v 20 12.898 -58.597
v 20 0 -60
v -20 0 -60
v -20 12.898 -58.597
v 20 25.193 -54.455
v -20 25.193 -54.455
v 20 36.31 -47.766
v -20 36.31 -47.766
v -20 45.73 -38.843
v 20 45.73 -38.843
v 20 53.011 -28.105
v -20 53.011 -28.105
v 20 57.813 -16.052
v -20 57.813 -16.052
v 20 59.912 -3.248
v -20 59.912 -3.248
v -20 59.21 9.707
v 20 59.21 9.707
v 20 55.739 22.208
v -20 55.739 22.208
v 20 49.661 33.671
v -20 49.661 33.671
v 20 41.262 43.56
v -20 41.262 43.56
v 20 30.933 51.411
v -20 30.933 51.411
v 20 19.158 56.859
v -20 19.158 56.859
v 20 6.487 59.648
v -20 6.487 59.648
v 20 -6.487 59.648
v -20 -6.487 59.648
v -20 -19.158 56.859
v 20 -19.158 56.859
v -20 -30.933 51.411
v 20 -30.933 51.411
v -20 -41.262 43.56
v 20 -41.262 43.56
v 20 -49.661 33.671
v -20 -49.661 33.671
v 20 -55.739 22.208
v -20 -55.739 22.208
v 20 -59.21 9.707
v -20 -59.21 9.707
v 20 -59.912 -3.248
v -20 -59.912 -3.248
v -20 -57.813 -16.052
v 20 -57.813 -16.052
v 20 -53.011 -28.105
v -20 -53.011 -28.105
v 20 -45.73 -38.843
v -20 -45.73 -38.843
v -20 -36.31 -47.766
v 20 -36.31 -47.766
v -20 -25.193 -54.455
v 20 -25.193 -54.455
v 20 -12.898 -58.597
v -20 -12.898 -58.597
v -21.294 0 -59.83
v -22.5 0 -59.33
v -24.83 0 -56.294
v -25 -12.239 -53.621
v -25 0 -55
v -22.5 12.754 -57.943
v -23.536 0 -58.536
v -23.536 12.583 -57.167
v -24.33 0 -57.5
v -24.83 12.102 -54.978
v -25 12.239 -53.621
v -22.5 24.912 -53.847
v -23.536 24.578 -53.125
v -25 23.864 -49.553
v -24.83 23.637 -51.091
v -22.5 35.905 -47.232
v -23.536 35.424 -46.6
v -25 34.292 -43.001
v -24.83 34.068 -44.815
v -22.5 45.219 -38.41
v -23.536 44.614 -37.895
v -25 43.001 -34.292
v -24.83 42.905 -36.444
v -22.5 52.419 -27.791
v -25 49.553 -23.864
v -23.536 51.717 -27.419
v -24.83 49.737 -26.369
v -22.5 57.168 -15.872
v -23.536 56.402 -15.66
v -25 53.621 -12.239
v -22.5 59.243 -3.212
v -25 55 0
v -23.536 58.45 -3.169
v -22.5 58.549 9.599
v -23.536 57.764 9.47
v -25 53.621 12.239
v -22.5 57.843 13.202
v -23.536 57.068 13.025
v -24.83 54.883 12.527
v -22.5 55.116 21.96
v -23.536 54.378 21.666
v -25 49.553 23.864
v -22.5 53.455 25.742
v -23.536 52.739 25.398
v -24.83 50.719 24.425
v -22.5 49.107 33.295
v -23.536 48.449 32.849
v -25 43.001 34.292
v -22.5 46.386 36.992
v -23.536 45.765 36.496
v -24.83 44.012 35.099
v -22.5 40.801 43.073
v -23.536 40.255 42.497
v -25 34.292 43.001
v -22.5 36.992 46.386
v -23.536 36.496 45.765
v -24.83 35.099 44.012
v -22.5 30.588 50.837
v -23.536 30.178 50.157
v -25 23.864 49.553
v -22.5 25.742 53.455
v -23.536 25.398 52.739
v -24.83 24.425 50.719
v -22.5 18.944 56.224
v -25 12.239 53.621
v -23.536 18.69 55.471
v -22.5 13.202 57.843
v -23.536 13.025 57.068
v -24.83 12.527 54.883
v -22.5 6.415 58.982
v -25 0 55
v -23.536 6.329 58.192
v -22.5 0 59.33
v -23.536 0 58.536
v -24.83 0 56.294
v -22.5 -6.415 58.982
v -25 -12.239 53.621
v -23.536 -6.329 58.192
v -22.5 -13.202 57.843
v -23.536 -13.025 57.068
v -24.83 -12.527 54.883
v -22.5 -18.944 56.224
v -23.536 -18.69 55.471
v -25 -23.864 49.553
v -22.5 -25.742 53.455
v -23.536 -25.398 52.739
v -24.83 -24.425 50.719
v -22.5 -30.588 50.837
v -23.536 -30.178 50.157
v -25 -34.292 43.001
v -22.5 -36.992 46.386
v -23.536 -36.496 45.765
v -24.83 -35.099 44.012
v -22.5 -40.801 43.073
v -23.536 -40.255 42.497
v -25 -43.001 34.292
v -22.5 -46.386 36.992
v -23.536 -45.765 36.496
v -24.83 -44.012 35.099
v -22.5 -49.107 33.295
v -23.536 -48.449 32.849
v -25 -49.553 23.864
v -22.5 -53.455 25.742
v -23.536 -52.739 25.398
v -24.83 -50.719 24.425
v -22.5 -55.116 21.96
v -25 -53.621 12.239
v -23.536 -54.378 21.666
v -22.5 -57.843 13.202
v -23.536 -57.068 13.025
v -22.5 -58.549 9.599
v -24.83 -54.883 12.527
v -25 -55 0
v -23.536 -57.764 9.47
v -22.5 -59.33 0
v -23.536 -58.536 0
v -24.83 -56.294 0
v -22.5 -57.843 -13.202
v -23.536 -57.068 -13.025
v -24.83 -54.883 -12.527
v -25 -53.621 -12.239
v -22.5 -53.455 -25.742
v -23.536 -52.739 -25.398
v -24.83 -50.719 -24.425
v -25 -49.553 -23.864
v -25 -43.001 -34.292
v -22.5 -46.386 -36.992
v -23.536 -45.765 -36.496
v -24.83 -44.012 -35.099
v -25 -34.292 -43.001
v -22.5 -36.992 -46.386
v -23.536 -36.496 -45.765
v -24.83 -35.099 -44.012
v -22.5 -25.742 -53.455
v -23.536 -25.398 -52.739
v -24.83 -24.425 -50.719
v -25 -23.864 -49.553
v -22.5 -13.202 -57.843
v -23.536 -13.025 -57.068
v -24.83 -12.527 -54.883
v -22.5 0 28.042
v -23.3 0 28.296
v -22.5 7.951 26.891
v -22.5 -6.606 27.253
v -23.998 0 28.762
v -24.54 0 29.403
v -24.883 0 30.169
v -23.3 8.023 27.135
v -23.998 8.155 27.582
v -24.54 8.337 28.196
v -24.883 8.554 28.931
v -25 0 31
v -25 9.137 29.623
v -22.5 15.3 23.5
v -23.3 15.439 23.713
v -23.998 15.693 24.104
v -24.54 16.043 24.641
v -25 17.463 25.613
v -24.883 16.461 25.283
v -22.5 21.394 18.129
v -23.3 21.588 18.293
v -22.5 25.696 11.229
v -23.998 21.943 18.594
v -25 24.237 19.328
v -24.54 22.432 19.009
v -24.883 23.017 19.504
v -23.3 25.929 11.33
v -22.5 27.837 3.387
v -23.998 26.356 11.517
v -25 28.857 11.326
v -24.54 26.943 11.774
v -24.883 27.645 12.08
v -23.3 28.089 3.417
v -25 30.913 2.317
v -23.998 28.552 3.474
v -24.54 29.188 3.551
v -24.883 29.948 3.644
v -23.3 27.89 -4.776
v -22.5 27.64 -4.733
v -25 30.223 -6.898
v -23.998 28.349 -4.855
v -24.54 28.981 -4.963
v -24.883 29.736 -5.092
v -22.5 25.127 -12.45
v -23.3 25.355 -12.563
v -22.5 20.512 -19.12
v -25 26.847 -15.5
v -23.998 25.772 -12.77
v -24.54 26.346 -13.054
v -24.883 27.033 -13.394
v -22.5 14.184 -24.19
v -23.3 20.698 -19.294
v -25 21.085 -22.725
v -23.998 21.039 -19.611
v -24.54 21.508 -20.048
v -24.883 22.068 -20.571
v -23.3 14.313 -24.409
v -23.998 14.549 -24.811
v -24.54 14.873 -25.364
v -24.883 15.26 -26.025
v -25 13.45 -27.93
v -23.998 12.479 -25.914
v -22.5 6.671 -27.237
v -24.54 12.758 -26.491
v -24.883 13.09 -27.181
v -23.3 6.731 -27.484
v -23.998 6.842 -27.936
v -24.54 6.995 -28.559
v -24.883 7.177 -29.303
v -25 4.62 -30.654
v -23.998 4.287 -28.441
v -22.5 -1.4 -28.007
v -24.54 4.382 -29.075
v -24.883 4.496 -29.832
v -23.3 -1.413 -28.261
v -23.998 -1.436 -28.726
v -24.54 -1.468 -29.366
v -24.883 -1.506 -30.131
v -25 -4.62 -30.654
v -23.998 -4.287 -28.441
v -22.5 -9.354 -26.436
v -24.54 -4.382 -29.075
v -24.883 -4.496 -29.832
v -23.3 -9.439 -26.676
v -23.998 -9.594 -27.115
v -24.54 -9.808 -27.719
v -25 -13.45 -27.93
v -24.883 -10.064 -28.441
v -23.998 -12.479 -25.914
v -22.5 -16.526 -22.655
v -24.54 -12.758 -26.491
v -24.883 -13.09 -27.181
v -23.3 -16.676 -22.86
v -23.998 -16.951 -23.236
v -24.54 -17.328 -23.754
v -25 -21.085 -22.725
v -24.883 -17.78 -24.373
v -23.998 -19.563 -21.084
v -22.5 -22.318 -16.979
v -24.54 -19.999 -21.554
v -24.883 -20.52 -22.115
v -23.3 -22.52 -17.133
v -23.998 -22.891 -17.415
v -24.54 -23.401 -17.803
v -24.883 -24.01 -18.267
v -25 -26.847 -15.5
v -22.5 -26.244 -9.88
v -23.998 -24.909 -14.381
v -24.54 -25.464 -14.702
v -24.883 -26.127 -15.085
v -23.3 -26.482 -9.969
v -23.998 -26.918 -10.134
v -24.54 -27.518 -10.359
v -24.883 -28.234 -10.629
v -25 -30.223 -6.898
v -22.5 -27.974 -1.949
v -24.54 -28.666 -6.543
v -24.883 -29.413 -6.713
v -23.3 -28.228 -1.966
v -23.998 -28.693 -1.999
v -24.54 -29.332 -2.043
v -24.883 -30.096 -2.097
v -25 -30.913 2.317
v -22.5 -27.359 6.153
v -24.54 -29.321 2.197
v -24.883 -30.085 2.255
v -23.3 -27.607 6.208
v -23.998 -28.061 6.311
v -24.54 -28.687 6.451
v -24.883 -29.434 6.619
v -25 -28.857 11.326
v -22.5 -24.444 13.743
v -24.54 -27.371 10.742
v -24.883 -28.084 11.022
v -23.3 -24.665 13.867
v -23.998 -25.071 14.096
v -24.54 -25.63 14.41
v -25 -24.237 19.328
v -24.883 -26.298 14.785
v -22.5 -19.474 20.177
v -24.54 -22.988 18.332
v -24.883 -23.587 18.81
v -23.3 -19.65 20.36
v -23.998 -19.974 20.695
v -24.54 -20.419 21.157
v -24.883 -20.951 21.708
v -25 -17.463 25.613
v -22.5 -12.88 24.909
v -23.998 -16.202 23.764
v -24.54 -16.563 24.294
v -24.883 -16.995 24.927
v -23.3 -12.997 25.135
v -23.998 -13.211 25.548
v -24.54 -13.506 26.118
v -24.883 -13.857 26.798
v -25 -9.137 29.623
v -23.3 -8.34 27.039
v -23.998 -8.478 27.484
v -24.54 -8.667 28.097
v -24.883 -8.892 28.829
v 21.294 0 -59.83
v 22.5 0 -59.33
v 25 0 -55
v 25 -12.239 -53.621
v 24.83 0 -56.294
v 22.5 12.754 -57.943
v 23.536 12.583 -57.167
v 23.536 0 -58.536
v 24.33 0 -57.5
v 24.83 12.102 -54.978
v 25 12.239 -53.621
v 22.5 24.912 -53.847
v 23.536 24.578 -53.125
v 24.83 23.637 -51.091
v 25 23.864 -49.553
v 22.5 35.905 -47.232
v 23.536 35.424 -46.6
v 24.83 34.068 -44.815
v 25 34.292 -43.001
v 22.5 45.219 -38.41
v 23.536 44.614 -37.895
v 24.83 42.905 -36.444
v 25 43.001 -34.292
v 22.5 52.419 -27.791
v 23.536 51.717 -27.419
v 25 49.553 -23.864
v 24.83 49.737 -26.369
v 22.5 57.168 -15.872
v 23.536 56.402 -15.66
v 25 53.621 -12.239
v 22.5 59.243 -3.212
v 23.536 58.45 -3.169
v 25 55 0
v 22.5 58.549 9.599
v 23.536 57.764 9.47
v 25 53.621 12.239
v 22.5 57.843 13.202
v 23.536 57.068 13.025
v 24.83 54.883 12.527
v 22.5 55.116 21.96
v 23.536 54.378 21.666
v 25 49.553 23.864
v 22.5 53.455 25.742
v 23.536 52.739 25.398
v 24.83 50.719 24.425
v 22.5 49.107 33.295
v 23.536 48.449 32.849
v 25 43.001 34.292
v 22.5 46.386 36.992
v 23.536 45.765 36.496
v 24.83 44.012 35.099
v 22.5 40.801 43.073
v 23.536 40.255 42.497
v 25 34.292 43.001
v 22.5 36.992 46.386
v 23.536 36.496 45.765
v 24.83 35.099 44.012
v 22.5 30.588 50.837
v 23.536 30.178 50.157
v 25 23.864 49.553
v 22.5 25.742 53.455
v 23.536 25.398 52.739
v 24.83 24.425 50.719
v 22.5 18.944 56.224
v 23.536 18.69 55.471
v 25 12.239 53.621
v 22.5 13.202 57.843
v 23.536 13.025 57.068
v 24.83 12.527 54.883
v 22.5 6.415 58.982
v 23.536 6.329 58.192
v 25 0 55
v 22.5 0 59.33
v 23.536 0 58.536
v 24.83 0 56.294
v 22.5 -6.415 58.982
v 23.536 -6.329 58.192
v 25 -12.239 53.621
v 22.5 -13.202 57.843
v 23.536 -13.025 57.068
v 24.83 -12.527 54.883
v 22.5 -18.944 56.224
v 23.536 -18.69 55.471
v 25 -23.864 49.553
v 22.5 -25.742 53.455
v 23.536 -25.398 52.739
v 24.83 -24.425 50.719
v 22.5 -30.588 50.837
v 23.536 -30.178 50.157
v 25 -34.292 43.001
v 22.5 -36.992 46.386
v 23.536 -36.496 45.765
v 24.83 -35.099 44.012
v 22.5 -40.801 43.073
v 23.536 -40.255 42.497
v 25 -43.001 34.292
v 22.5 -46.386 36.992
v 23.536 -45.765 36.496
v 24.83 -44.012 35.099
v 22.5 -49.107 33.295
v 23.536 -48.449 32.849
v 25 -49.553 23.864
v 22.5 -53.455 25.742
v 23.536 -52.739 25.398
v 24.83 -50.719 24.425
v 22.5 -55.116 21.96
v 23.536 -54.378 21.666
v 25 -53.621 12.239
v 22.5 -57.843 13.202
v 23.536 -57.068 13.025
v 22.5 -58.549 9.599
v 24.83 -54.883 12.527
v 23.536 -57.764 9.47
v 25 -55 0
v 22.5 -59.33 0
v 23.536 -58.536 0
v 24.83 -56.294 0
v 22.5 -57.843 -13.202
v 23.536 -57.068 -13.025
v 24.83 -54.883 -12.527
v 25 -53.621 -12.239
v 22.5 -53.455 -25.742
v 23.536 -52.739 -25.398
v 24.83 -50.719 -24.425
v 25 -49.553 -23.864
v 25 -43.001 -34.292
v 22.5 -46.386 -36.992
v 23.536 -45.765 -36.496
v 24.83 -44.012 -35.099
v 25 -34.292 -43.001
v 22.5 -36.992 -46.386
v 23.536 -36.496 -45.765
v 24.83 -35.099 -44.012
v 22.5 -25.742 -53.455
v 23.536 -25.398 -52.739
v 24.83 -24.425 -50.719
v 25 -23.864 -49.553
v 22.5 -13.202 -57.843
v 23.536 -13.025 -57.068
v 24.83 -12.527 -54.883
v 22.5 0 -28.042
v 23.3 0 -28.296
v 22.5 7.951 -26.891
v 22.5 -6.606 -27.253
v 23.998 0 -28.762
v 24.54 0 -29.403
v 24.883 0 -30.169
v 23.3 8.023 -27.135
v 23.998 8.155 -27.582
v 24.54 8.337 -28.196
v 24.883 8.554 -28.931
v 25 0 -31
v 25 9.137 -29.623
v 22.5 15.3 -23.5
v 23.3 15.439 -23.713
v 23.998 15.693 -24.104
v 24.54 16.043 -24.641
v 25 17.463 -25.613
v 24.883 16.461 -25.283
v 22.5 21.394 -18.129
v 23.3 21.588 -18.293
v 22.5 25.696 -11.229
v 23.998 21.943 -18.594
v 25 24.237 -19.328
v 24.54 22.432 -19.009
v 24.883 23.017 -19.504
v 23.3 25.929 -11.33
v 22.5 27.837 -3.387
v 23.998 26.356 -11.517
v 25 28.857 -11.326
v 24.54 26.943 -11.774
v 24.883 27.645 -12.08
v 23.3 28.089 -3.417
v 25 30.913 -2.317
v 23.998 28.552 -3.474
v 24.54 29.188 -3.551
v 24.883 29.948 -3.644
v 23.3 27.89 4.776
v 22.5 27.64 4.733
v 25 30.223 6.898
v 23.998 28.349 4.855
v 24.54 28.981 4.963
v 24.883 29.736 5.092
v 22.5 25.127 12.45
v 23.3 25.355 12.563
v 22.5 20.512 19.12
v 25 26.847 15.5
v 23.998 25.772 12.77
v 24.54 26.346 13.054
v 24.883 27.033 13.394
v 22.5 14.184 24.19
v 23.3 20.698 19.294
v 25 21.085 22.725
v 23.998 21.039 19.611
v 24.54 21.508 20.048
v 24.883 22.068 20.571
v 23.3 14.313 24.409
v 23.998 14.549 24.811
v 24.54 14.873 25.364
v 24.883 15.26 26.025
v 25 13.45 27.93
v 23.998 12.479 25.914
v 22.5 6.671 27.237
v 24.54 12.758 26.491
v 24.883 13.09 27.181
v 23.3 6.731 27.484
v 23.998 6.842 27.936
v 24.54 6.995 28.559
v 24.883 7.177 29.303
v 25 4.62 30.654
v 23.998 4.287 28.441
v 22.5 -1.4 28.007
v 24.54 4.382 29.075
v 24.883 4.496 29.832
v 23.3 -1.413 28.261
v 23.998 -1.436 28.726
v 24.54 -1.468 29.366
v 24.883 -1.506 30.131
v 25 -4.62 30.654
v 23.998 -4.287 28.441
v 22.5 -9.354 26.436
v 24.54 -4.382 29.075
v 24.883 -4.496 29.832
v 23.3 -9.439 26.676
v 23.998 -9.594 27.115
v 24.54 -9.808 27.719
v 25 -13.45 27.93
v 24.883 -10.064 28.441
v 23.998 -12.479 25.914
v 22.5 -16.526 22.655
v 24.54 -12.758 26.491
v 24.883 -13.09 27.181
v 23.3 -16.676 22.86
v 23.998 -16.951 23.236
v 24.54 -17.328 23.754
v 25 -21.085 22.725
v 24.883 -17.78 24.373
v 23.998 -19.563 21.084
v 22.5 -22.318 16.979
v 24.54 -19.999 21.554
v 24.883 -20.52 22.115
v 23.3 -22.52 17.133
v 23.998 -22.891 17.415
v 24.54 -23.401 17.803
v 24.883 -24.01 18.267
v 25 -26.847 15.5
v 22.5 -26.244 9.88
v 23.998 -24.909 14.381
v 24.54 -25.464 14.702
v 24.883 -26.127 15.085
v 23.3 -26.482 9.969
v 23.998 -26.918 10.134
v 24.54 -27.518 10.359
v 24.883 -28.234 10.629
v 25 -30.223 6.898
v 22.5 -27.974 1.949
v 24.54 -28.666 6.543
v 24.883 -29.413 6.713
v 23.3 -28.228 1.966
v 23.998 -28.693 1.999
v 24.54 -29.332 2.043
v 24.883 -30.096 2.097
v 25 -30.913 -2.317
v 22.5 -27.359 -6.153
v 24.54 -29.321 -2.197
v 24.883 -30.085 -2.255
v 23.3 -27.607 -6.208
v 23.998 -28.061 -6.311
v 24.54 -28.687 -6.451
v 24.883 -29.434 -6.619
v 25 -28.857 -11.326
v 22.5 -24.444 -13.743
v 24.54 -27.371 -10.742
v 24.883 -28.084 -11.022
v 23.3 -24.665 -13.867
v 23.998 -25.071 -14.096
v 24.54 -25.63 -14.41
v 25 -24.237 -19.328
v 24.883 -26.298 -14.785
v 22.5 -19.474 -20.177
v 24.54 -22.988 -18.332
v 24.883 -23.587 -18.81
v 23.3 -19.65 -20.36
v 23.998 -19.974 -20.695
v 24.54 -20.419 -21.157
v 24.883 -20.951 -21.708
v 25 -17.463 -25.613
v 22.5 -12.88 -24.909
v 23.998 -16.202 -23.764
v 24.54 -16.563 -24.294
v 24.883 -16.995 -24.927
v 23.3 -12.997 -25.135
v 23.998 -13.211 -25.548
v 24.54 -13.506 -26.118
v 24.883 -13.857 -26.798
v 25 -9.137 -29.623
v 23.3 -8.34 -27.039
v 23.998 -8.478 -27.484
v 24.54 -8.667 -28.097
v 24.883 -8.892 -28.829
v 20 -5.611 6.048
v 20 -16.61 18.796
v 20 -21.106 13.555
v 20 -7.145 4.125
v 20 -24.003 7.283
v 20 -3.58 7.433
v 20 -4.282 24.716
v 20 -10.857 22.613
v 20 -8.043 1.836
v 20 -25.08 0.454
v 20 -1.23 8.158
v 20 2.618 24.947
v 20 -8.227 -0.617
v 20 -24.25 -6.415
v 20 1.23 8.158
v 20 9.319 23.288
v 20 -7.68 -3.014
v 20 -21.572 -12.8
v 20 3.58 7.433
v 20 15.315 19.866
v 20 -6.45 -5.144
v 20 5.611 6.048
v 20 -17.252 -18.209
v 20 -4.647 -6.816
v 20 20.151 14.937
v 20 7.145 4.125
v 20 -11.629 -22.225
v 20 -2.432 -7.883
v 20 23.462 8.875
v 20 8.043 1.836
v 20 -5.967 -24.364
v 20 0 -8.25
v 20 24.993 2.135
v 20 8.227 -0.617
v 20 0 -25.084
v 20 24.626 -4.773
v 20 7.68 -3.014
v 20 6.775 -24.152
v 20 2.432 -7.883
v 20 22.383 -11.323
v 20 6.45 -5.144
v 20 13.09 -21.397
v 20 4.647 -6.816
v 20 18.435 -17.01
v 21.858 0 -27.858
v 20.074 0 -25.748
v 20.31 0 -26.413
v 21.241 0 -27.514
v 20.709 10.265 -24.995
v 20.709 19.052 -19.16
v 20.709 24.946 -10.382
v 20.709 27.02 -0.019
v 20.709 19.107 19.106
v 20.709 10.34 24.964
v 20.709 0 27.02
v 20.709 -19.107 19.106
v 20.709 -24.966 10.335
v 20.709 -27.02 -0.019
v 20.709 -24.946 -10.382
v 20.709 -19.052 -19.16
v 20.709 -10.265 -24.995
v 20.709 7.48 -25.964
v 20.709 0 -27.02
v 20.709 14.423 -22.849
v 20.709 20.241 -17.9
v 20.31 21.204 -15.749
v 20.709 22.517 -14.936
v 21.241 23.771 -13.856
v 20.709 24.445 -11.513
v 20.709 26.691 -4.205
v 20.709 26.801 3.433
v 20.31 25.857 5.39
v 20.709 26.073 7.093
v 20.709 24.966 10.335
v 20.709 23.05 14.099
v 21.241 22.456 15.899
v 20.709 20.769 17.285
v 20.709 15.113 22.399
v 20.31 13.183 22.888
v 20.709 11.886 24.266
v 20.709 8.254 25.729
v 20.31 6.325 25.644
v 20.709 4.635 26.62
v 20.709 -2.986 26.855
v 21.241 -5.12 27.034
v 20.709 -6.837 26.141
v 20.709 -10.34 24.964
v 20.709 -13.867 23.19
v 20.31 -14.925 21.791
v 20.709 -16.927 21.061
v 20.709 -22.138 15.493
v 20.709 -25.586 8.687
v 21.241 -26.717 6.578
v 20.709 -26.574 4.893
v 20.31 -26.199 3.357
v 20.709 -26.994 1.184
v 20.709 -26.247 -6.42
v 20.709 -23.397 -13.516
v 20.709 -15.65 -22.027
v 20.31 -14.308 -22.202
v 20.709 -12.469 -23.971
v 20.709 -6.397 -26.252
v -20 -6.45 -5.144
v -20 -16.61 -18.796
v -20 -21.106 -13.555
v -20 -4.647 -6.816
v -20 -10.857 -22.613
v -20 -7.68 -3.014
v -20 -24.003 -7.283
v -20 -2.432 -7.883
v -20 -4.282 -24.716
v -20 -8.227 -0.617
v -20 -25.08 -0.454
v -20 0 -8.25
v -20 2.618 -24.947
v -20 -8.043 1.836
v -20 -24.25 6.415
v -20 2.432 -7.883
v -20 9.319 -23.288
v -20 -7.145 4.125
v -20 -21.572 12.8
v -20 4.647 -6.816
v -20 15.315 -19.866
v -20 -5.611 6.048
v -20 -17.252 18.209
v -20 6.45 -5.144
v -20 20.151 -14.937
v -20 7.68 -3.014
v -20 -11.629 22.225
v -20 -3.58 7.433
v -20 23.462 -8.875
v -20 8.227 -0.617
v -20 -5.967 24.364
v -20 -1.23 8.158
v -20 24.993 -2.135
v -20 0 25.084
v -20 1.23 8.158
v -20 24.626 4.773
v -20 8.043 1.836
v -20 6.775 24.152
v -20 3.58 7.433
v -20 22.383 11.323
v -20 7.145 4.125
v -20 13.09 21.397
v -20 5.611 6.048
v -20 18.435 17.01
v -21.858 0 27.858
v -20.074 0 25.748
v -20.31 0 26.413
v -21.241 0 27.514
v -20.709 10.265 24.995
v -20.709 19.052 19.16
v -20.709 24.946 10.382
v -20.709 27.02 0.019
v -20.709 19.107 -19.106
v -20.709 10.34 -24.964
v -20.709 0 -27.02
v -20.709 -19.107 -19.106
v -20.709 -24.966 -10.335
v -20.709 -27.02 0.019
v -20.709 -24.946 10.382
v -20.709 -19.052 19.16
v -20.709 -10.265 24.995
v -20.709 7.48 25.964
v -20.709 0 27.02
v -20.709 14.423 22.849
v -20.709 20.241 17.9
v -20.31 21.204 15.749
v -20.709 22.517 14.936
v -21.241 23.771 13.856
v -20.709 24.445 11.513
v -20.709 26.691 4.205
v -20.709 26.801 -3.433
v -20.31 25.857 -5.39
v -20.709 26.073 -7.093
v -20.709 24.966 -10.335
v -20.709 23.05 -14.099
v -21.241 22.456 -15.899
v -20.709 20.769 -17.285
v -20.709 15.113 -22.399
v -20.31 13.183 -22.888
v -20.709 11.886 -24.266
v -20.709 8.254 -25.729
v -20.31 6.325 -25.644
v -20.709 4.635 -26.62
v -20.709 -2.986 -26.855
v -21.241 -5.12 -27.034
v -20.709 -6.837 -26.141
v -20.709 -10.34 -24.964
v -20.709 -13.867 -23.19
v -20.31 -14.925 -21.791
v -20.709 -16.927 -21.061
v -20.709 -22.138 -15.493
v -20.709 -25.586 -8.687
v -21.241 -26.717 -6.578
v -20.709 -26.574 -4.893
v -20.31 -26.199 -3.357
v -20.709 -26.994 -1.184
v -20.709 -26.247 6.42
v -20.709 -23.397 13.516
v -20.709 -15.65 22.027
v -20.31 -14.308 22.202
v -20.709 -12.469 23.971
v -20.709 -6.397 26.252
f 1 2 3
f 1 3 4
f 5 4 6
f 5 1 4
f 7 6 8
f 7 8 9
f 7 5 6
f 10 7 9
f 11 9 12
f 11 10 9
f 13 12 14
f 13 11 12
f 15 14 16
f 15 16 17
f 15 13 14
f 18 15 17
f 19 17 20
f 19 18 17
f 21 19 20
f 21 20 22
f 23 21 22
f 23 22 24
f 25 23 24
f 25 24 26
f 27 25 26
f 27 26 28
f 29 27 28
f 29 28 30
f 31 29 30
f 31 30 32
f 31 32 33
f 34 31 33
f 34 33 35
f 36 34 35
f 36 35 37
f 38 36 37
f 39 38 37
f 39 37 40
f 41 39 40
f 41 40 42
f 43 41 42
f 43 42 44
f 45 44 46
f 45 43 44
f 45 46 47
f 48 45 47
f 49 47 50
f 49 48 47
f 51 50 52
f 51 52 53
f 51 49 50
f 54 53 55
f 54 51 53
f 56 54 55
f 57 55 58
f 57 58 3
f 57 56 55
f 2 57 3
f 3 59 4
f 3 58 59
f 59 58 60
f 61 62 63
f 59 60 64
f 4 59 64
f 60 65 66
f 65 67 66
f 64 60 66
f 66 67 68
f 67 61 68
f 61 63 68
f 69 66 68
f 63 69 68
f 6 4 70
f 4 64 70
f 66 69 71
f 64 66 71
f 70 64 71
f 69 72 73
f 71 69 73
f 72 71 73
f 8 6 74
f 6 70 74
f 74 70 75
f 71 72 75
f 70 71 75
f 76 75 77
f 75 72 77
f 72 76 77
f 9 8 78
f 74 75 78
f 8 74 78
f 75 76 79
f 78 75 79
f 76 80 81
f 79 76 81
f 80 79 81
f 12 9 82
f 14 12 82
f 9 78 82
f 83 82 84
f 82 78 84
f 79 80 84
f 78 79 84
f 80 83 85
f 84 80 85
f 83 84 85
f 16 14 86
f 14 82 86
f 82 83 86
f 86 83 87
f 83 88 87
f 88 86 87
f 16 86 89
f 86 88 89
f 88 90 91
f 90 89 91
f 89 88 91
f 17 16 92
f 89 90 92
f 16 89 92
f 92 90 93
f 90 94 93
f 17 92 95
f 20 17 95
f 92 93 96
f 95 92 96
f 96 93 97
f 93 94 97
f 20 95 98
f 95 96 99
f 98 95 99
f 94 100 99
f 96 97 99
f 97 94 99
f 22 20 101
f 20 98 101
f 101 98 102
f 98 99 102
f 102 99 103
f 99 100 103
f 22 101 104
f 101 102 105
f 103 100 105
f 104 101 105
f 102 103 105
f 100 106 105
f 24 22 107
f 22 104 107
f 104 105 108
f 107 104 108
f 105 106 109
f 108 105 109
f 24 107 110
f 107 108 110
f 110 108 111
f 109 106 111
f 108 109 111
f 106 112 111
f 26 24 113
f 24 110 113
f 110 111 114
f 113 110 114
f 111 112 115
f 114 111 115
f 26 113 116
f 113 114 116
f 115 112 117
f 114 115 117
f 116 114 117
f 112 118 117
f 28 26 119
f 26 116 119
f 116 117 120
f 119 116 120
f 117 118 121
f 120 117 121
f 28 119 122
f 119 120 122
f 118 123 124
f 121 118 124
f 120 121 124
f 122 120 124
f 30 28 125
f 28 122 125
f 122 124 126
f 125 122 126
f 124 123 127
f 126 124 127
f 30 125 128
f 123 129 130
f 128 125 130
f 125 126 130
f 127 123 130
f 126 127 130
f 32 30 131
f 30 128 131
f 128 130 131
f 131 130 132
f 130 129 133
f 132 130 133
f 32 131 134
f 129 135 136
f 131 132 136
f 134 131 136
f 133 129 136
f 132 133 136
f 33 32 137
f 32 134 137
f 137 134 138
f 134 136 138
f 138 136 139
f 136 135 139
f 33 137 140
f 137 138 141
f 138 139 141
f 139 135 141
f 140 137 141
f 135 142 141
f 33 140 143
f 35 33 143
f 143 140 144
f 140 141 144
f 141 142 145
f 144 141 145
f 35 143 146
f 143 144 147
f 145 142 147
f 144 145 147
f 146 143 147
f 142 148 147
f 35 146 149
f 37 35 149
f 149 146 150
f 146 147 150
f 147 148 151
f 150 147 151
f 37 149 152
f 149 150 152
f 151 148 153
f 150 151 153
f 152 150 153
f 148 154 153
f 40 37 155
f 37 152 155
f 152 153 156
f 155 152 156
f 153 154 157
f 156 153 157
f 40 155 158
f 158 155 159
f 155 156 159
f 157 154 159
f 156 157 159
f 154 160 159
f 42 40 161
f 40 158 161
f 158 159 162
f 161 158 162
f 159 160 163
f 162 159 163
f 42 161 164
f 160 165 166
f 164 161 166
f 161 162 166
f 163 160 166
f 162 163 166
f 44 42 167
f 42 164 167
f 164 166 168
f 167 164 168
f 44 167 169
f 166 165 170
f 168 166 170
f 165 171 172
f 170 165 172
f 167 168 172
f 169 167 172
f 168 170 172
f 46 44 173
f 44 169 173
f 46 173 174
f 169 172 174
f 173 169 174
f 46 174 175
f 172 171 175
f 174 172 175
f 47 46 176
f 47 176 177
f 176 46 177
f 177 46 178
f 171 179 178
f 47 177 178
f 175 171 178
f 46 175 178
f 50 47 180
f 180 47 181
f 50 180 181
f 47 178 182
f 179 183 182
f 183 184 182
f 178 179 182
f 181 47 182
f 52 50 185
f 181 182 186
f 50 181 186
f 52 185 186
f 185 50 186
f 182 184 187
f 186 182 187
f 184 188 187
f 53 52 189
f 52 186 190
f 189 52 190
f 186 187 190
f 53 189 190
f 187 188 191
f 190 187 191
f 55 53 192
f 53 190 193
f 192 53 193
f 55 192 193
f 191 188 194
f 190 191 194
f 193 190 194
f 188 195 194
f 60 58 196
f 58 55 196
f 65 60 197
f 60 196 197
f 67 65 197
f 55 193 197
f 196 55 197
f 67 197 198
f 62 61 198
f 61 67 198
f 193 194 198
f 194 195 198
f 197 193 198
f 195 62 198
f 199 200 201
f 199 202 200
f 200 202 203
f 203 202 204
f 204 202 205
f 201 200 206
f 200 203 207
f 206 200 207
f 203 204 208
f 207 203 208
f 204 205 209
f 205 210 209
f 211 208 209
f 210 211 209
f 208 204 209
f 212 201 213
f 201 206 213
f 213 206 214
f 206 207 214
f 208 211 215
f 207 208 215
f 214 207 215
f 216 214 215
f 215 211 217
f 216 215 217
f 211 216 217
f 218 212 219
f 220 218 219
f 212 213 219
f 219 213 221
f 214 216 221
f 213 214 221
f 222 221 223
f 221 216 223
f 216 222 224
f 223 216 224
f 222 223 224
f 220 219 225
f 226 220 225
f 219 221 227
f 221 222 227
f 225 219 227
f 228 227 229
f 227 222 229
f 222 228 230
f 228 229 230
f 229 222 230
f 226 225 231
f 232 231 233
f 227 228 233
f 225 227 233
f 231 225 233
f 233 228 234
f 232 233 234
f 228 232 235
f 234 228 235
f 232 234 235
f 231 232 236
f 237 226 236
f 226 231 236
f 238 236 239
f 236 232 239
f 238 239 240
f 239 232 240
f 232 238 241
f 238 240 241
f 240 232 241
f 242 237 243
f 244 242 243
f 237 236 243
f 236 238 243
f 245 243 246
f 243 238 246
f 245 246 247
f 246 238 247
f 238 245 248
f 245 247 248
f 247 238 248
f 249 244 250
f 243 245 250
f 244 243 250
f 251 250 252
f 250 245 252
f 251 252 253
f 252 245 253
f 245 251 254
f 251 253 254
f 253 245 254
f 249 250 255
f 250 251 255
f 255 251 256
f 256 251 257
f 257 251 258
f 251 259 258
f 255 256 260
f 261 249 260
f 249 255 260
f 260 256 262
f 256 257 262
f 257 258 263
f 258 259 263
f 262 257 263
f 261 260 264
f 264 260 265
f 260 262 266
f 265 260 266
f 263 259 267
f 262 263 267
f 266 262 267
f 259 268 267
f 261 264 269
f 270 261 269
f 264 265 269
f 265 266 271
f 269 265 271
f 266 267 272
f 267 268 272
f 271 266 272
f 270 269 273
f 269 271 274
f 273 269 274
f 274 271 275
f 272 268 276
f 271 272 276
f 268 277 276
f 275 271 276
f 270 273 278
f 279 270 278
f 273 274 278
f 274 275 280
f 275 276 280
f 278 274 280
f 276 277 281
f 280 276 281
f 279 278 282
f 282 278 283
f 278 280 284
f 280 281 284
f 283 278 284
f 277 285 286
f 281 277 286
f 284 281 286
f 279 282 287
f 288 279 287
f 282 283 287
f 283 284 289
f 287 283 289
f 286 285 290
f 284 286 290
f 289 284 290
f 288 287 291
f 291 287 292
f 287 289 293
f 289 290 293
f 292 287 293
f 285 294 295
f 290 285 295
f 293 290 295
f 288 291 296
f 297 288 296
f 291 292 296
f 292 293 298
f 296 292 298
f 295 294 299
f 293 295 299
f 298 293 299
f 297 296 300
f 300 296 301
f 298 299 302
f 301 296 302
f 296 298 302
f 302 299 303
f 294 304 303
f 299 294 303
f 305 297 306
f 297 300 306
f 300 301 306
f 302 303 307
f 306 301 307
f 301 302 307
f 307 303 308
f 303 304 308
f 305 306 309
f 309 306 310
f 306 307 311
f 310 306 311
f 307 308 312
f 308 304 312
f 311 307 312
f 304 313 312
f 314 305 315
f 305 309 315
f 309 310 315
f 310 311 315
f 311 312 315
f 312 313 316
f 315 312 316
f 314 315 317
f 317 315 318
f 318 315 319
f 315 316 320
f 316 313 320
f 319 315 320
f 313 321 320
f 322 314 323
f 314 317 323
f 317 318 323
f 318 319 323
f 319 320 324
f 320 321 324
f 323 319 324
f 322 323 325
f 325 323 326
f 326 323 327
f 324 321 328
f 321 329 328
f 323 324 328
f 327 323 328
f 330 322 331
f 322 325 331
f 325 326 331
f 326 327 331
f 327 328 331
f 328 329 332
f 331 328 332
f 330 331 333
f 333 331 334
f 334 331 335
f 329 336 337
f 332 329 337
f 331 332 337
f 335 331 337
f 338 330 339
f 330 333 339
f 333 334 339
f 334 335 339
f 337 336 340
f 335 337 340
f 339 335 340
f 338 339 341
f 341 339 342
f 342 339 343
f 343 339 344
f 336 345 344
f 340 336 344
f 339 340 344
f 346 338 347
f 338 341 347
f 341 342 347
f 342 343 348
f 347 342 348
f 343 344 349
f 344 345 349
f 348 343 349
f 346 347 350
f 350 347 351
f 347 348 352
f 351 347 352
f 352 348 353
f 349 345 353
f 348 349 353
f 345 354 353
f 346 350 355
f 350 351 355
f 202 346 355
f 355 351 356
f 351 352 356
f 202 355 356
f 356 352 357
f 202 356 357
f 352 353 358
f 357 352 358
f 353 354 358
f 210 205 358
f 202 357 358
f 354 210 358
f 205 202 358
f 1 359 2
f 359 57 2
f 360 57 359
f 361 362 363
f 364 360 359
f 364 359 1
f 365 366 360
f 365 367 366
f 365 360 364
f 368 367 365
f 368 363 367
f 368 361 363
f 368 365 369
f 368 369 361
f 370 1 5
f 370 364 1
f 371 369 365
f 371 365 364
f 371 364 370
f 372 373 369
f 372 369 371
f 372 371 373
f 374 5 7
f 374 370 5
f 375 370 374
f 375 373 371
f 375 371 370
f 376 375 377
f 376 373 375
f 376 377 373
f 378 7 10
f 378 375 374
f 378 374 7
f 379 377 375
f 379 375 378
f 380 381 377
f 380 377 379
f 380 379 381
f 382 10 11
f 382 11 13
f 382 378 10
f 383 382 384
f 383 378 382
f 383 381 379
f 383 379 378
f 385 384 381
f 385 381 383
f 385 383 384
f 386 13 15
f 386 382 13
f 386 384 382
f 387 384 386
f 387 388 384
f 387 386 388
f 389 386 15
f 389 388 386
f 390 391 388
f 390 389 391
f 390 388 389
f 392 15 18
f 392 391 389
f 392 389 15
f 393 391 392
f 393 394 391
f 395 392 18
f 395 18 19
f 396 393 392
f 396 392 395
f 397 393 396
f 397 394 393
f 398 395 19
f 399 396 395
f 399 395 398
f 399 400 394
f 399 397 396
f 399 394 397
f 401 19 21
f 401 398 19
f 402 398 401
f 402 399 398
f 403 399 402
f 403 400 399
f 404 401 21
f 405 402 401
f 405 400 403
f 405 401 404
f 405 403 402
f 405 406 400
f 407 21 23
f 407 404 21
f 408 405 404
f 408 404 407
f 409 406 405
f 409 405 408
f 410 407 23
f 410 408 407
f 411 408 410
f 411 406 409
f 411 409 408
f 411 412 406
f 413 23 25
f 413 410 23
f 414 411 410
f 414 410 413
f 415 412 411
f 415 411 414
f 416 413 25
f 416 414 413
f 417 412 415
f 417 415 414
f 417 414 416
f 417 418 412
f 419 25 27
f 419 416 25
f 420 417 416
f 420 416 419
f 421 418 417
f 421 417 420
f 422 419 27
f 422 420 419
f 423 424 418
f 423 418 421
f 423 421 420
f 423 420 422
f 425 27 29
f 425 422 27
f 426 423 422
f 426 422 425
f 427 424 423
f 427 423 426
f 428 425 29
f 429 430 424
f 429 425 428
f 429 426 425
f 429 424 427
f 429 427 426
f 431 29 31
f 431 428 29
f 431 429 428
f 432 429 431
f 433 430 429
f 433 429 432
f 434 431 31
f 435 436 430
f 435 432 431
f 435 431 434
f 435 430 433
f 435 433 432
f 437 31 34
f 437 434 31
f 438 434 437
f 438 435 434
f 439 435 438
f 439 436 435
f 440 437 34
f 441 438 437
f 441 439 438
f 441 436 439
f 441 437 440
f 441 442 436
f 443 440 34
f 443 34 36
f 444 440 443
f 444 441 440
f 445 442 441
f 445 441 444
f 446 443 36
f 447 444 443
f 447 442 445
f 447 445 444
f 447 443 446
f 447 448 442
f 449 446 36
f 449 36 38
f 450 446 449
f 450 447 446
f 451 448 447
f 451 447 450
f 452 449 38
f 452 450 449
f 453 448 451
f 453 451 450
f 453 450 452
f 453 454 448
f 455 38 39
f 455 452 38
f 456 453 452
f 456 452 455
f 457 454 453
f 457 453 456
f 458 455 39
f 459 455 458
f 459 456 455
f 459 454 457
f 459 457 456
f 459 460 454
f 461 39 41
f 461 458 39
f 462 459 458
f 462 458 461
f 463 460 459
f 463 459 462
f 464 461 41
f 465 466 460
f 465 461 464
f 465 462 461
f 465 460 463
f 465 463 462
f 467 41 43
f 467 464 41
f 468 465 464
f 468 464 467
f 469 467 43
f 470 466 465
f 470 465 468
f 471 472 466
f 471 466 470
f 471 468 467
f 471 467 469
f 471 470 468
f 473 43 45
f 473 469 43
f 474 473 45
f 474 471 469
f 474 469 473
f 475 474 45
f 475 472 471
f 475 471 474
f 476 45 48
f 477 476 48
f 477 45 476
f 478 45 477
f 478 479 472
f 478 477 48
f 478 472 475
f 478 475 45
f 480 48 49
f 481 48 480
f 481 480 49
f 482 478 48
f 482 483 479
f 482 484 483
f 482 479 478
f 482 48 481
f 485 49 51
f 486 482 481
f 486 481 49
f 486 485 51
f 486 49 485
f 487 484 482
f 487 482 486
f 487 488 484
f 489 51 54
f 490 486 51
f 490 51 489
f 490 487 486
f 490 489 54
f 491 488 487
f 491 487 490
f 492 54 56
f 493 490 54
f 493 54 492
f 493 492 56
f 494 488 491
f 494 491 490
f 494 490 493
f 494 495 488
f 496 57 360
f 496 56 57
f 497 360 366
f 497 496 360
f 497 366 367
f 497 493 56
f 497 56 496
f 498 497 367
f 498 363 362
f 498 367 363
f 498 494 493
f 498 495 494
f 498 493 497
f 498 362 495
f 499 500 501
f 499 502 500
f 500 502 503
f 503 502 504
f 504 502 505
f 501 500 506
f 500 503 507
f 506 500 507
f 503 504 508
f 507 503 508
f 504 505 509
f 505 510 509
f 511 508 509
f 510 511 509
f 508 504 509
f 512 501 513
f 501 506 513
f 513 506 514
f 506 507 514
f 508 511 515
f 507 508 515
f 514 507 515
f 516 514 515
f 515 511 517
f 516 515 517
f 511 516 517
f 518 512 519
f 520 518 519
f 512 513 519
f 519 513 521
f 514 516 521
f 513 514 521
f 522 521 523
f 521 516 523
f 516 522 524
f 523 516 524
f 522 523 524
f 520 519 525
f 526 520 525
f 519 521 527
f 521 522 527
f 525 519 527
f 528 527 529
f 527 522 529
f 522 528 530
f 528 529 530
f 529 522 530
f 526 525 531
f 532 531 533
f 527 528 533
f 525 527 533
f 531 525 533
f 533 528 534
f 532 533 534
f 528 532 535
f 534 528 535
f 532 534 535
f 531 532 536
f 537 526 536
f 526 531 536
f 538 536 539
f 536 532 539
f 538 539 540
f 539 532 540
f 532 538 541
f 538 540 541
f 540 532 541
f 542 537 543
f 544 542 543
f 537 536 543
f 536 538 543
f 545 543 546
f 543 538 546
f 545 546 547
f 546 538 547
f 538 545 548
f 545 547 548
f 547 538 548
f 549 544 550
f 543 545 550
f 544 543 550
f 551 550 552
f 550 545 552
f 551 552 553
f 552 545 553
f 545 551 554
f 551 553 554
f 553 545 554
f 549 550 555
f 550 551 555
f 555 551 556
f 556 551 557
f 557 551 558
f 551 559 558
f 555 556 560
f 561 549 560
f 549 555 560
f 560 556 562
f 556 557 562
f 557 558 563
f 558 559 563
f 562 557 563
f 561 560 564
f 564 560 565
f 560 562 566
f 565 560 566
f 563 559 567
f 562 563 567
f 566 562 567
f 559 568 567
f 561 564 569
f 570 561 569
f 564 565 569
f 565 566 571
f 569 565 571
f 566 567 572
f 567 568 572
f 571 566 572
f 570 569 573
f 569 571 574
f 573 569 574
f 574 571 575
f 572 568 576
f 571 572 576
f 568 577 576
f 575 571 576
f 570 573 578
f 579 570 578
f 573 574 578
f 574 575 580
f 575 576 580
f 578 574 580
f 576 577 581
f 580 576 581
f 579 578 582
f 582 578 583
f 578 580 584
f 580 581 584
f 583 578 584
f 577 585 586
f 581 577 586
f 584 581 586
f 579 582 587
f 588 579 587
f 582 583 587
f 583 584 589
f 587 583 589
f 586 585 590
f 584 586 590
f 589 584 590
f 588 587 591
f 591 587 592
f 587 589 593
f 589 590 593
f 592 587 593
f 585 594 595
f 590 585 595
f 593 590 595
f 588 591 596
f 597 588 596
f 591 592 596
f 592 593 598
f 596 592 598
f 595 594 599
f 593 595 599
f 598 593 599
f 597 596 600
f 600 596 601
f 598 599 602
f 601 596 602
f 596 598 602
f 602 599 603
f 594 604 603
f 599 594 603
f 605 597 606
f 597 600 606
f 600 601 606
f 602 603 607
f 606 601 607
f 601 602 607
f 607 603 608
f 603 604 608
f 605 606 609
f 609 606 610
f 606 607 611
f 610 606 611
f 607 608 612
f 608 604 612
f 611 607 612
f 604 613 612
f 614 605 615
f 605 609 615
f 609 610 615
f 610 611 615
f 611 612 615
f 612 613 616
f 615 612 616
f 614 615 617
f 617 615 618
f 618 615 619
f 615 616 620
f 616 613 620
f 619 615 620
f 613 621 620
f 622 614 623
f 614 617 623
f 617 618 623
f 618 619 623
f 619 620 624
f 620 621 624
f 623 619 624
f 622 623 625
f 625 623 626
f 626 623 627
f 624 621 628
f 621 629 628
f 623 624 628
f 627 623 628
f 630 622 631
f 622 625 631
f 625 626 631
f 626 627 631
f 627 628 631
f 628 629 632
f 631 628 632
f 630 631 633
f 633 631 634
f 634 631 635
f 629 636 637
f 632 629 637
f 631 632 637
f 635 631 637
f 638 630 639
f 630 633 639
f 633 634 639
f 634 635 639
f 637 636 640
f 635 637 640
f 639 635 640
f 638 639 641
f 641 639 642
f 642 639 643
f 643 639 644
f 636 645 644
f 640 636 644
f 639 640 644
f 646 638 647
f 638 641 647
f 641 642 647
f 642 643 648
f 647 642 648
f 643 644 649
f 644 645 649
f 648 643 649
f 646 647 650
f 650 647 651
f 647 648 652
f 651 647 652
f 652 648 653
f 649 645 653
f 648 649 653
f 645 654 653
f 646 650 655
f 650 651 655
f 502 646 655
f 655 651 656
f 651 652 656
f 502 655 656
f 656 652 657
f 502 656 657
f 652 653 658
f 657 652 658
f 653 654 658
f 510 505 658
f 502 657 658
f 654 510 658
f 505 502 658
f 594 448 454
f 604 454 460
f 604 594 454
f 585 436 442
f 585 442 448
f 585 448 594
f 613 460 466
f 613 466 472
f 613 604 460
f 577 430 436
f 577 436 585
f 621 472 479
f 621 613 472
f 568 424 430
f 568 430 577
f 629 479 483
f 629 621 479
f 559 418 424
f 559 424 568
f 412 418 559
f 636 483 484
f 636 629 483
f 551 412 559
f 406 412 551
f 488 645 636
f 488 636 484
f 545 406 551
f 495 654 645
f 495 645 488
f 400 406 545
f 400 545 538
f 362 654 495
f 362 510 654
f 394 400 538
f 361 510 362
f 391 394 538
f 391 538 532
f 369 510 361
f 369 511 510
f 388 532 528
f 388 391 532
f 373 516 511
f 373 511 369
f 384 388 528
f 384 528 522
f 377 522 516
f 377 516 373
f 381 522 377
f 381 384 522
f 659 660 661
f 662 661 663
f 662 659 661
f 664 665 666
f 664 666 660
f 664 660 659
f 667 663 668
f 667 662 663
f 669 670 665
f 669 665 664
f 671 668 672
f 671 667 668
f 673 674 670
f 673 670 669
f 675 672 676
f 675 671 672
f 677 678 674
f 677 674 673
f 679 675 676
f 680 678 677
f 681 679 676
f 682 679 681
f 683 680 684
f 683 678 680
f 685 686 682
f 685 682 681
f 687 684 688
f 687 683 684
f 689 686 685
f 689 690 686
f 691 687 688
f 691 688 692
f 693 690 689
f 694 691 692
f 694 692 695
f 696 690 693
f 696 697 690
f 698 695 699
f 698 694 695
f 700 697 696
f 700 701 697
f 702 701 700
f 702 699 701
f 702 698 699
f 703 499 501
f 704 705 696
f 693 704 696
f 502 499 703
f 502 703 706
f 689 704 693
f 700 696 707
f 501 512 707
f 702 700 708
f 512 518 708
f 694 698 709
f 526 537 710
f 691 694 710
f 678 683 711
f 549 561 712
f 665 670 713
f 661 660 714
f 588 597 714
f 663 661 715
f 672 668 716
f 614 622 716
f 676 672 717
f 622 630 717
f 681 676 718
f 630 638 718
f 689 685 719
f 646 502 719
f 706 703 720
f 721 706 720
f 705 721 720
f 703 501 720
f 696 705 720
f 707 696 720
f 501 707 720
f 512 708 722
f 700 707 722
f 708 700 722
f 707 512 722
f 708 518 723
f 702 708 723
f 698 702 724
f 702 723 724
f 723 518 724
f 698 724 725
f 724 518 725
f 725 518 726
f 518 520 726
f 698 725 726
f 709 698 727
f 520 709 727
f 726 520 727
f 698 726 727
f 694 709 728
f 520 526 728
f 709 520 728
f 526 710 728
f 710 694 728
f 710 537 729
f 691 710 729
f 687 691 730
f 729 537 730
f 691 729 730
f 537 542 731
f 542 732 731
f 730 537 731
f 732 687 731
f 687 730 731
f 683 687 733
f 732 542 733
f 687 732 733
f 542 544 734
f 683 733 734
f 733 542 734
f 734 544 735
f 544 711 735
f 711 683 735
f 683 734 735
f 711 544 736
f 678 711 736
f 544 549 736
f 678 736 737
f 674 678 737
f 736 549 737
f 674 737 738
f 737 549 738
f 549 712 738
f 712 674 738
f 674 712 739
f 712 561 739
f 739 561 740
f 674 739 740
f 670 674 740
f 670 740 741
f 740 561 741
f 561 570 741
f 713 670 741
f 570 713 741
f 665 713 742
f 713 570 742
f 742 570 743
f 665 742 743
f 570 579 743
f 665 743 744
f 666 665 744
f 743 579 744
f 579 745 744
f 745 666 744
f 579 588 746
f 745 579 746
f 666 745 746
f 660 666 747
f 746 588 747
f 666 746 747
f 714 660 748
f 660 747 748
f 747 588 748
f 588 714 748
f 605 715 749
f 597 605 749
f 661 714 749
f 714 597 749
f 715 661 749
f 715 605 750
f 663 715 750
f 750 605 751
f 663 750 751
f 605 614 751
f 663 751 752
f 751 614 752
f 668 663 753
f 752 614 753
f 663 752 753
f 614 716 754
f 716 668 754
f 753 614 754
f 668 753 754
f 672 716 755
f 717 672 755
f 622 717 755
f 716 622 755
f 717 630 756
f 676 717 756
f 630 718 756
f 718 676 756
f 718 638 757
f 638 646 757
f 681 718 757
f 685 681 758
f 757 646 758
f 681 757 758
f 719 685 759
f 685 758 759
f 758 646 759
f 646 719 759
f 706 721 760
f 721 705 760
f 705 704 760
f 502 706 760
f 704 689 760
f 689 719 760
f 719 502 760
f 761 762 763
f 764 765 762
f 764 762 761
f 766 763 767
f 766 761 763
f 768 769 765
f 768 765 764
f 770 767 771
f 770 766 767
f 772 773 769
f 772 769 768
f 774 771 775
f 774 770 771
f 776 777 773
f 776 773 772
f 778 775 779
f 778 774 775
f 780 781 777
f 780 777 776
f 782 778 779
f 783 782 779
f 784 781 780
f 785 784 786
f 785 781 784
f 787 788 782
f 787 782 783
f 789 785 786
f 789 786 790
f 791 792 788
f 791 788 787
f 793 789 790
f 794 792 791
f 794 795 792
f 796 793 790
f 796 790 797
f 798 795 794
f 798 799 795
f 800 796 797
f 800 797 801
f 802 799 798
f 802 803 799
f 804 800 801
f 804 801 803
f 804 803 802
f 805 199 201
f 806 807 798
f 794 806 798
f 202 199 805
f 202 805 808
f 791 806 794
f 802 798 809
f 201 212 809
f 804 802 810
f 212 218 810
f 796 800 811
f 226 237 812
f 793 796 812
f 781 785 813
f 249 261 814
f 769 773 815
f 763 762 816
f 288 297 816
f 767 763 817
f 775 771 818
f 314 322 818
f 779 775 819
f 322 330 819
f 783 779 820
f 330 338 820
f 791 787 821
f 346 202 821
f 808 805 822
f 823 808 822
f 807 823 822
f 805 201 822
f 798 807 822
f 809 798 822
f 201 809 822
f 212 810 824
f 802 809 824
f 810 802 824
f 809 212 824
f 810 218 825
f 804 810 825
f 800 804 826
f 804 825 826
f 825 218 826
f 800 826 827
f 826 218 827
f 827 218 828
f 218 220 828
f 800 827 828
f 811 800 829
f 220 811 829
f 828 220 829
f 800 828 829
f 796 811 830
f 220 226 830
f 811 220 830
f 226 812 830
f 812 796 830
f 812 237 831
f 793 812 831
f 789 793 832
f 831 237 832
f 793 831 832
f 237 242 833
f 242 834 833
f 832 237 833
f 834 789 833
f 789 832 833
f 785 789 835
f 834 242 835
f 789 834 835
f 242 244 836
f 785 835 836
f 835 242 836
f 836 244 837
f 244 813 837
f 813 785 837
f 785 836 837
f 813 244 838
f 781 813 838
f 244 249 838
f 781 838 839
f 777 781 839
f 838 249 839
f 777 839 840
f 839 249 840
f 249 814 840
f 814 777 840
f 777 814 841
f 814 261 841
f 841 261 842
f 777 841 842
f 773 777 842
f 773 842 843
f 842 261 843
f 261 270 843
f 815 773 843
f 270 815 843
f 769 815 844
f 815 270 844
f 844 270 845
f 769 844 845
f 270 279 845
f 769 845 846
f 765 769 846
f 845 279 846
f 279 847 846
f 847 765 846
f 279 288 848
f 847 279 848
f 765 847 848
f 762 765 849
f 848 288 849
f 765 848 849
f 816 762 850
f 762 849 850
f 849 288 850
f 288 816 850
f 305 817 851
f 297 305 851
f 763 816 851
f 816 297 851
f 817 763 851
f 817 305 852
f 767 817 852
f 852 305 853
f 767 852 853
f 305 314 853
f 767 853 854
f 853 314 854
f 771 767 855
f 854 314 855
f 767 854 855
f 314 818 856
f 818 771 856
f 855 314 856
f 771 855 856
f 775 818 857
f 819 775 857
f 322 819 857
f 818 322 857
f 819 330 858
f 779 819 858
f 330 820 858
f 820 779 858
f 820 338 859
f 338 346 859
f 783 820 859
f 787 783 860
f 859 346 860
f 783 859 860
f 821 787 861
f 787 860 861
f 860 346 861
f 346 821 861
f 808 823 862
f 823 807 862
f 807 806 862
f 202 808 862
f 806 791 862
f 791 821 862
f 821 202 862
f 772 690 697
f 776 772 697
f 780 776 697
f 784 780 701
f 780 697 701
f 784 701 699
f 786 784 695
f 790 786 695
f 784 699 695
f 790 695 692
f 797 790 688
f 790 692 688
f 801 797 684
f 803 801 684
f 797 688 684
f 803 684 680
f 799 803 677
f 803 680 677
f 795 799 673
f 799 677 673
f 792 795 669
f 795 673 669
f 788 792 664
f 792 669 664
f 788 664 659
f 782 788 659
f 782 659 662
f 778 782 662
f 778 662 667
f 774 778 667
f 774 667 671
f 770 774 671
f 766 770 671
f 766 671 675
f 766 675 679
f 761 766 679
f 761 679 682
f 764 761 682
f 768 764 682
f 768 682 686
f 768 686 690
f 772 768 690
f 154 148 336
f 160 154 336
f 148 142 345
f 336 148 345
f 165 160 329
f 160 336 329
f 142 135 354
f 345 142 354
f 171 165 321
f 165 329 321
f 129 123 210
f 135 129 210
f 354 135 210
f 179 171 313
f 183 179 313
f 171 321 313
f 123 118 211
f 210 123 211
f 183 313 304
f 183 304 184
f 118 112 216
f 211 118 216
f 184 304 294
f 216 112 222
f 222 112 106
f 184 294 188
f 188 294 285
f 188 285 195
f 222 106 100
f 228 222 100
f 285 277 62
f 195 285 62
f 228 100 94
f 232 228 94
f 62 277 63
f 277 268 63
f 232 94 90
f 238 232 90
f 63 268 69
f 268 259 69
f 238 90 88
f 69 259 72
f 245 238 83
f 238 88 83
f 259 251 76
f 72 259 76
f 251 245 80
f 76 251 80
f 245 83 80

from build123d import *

# Parameters (mm, degrees)
SKETCH_1_R          = 60
EXTRUDE_1_DEPTH     = 25
FILLET_1_R          = 5
SKETCH_2_R          = 8.25
CUT_EXTRUDE_1_DEPTH = 99.488578018
CHAMFER_1_SIZE      = 3
SKETCH_3_R          = 28
CUT_EXTRUDE_2_DEPTH = 5
FILLET_2_R          = 3
FILLET_3_R          = 3
SKETCH_4_R          = 28
CUT_EXTRUDE_3_DEPTH = 5
FILLET_4_R          = 3
FILLET_5_R          = 3


with BuildPart() as part:
    # 草图1 → 凸台-拉伸1 (new, symmetric)
    with BuildSketch(Plane(origin=(0, 0, 0), x_dir=(0, 0, -1), z_dir=(1, 0, 0))):
        Circle(SKETCH_1_R)
    extrude(amount=EXTRUDE_1_DEPTH, both=True)

    # 圆角1
    fillet_1_edges = [part.edges().sort_by_distance(p)[0] for p in [
        (-25, 0, 60),
        (25, 0, 60),
    ]]
    fillet(fillet_1_edges, radius=FILLET_1_R)

    # 草图2 → 切除-拉伸1 (cut, through all)
    with BuildSketch(Plane(origin=(25, 0, 0), x_dir=(0, 0, -1), z_dir=(1, 0, 0))):
        Circle(SKETCH_2_R)
    extrude(amount=-CUT_EXTRUDE_1_DEPTH, mode=Mode.SUBTRACT)

    # 倒角1
    chamfer_1_edges = [part.edges().sort_by_distance(p)[0] for p in [
        (-25, 0, 8.25),
        (25, 0, 8.25),
    ]]
    chamfer(chamfer_1_edges, length=CHAMFER_1_SIZE)

    # 草图3 → 切除-拉伸2 (cut)
    with BuildSketch(Plane(origin=(25, 0, 0), x_dir=(0, 0, -1), z_dir=(1, 0, 0))):
        Circle(SKETCH_3_R)
    extrude(amount=-CUT_EXTRUDE_2_DEPTH, mode=Mode.SUBTRACT)

    # 圆角2
    fillet_2_edges = [part.edges().sort_by_distance(p)[0] for p in [
        (25, 0, 28),
    ]]
    fillet(fillet_2_edges, radius=FILLET_2_R)

    # 圆角3
    fillet_3_edges = [part.edges().sort_by_distance(p)[0] for p in [
        (20, 0, 28),
    ]]
    fillet(fillet_3_edges, radius=FILLET_3_R)

    # 草图4 → 切除-拉伸3 (cut)
    with BuildSketch(Plane.ZY.offset(25)):
        Circle(SKETCH_4_R)
    extrude(amount=-CUT_EXTRUDE_3_DEPTH, mode=Mode.SUBTRACT)

    # 圆角4
    fillet_4_edges = [part.edges().sort_by_distance(p)[0] for p in [
        (-25, 0, -28),
    ]]
    fillet(fillet_4_edges, radius=FILLET_4_R)

    # 圆角5
    fillet_5_edges = [part.edges().sort_by_distance(p)[0] for p in [
        (-20, 0, -28),
    ]]
    fillet(fillet_5_edges, radius=FILLET_5_R)


solid = part.part
